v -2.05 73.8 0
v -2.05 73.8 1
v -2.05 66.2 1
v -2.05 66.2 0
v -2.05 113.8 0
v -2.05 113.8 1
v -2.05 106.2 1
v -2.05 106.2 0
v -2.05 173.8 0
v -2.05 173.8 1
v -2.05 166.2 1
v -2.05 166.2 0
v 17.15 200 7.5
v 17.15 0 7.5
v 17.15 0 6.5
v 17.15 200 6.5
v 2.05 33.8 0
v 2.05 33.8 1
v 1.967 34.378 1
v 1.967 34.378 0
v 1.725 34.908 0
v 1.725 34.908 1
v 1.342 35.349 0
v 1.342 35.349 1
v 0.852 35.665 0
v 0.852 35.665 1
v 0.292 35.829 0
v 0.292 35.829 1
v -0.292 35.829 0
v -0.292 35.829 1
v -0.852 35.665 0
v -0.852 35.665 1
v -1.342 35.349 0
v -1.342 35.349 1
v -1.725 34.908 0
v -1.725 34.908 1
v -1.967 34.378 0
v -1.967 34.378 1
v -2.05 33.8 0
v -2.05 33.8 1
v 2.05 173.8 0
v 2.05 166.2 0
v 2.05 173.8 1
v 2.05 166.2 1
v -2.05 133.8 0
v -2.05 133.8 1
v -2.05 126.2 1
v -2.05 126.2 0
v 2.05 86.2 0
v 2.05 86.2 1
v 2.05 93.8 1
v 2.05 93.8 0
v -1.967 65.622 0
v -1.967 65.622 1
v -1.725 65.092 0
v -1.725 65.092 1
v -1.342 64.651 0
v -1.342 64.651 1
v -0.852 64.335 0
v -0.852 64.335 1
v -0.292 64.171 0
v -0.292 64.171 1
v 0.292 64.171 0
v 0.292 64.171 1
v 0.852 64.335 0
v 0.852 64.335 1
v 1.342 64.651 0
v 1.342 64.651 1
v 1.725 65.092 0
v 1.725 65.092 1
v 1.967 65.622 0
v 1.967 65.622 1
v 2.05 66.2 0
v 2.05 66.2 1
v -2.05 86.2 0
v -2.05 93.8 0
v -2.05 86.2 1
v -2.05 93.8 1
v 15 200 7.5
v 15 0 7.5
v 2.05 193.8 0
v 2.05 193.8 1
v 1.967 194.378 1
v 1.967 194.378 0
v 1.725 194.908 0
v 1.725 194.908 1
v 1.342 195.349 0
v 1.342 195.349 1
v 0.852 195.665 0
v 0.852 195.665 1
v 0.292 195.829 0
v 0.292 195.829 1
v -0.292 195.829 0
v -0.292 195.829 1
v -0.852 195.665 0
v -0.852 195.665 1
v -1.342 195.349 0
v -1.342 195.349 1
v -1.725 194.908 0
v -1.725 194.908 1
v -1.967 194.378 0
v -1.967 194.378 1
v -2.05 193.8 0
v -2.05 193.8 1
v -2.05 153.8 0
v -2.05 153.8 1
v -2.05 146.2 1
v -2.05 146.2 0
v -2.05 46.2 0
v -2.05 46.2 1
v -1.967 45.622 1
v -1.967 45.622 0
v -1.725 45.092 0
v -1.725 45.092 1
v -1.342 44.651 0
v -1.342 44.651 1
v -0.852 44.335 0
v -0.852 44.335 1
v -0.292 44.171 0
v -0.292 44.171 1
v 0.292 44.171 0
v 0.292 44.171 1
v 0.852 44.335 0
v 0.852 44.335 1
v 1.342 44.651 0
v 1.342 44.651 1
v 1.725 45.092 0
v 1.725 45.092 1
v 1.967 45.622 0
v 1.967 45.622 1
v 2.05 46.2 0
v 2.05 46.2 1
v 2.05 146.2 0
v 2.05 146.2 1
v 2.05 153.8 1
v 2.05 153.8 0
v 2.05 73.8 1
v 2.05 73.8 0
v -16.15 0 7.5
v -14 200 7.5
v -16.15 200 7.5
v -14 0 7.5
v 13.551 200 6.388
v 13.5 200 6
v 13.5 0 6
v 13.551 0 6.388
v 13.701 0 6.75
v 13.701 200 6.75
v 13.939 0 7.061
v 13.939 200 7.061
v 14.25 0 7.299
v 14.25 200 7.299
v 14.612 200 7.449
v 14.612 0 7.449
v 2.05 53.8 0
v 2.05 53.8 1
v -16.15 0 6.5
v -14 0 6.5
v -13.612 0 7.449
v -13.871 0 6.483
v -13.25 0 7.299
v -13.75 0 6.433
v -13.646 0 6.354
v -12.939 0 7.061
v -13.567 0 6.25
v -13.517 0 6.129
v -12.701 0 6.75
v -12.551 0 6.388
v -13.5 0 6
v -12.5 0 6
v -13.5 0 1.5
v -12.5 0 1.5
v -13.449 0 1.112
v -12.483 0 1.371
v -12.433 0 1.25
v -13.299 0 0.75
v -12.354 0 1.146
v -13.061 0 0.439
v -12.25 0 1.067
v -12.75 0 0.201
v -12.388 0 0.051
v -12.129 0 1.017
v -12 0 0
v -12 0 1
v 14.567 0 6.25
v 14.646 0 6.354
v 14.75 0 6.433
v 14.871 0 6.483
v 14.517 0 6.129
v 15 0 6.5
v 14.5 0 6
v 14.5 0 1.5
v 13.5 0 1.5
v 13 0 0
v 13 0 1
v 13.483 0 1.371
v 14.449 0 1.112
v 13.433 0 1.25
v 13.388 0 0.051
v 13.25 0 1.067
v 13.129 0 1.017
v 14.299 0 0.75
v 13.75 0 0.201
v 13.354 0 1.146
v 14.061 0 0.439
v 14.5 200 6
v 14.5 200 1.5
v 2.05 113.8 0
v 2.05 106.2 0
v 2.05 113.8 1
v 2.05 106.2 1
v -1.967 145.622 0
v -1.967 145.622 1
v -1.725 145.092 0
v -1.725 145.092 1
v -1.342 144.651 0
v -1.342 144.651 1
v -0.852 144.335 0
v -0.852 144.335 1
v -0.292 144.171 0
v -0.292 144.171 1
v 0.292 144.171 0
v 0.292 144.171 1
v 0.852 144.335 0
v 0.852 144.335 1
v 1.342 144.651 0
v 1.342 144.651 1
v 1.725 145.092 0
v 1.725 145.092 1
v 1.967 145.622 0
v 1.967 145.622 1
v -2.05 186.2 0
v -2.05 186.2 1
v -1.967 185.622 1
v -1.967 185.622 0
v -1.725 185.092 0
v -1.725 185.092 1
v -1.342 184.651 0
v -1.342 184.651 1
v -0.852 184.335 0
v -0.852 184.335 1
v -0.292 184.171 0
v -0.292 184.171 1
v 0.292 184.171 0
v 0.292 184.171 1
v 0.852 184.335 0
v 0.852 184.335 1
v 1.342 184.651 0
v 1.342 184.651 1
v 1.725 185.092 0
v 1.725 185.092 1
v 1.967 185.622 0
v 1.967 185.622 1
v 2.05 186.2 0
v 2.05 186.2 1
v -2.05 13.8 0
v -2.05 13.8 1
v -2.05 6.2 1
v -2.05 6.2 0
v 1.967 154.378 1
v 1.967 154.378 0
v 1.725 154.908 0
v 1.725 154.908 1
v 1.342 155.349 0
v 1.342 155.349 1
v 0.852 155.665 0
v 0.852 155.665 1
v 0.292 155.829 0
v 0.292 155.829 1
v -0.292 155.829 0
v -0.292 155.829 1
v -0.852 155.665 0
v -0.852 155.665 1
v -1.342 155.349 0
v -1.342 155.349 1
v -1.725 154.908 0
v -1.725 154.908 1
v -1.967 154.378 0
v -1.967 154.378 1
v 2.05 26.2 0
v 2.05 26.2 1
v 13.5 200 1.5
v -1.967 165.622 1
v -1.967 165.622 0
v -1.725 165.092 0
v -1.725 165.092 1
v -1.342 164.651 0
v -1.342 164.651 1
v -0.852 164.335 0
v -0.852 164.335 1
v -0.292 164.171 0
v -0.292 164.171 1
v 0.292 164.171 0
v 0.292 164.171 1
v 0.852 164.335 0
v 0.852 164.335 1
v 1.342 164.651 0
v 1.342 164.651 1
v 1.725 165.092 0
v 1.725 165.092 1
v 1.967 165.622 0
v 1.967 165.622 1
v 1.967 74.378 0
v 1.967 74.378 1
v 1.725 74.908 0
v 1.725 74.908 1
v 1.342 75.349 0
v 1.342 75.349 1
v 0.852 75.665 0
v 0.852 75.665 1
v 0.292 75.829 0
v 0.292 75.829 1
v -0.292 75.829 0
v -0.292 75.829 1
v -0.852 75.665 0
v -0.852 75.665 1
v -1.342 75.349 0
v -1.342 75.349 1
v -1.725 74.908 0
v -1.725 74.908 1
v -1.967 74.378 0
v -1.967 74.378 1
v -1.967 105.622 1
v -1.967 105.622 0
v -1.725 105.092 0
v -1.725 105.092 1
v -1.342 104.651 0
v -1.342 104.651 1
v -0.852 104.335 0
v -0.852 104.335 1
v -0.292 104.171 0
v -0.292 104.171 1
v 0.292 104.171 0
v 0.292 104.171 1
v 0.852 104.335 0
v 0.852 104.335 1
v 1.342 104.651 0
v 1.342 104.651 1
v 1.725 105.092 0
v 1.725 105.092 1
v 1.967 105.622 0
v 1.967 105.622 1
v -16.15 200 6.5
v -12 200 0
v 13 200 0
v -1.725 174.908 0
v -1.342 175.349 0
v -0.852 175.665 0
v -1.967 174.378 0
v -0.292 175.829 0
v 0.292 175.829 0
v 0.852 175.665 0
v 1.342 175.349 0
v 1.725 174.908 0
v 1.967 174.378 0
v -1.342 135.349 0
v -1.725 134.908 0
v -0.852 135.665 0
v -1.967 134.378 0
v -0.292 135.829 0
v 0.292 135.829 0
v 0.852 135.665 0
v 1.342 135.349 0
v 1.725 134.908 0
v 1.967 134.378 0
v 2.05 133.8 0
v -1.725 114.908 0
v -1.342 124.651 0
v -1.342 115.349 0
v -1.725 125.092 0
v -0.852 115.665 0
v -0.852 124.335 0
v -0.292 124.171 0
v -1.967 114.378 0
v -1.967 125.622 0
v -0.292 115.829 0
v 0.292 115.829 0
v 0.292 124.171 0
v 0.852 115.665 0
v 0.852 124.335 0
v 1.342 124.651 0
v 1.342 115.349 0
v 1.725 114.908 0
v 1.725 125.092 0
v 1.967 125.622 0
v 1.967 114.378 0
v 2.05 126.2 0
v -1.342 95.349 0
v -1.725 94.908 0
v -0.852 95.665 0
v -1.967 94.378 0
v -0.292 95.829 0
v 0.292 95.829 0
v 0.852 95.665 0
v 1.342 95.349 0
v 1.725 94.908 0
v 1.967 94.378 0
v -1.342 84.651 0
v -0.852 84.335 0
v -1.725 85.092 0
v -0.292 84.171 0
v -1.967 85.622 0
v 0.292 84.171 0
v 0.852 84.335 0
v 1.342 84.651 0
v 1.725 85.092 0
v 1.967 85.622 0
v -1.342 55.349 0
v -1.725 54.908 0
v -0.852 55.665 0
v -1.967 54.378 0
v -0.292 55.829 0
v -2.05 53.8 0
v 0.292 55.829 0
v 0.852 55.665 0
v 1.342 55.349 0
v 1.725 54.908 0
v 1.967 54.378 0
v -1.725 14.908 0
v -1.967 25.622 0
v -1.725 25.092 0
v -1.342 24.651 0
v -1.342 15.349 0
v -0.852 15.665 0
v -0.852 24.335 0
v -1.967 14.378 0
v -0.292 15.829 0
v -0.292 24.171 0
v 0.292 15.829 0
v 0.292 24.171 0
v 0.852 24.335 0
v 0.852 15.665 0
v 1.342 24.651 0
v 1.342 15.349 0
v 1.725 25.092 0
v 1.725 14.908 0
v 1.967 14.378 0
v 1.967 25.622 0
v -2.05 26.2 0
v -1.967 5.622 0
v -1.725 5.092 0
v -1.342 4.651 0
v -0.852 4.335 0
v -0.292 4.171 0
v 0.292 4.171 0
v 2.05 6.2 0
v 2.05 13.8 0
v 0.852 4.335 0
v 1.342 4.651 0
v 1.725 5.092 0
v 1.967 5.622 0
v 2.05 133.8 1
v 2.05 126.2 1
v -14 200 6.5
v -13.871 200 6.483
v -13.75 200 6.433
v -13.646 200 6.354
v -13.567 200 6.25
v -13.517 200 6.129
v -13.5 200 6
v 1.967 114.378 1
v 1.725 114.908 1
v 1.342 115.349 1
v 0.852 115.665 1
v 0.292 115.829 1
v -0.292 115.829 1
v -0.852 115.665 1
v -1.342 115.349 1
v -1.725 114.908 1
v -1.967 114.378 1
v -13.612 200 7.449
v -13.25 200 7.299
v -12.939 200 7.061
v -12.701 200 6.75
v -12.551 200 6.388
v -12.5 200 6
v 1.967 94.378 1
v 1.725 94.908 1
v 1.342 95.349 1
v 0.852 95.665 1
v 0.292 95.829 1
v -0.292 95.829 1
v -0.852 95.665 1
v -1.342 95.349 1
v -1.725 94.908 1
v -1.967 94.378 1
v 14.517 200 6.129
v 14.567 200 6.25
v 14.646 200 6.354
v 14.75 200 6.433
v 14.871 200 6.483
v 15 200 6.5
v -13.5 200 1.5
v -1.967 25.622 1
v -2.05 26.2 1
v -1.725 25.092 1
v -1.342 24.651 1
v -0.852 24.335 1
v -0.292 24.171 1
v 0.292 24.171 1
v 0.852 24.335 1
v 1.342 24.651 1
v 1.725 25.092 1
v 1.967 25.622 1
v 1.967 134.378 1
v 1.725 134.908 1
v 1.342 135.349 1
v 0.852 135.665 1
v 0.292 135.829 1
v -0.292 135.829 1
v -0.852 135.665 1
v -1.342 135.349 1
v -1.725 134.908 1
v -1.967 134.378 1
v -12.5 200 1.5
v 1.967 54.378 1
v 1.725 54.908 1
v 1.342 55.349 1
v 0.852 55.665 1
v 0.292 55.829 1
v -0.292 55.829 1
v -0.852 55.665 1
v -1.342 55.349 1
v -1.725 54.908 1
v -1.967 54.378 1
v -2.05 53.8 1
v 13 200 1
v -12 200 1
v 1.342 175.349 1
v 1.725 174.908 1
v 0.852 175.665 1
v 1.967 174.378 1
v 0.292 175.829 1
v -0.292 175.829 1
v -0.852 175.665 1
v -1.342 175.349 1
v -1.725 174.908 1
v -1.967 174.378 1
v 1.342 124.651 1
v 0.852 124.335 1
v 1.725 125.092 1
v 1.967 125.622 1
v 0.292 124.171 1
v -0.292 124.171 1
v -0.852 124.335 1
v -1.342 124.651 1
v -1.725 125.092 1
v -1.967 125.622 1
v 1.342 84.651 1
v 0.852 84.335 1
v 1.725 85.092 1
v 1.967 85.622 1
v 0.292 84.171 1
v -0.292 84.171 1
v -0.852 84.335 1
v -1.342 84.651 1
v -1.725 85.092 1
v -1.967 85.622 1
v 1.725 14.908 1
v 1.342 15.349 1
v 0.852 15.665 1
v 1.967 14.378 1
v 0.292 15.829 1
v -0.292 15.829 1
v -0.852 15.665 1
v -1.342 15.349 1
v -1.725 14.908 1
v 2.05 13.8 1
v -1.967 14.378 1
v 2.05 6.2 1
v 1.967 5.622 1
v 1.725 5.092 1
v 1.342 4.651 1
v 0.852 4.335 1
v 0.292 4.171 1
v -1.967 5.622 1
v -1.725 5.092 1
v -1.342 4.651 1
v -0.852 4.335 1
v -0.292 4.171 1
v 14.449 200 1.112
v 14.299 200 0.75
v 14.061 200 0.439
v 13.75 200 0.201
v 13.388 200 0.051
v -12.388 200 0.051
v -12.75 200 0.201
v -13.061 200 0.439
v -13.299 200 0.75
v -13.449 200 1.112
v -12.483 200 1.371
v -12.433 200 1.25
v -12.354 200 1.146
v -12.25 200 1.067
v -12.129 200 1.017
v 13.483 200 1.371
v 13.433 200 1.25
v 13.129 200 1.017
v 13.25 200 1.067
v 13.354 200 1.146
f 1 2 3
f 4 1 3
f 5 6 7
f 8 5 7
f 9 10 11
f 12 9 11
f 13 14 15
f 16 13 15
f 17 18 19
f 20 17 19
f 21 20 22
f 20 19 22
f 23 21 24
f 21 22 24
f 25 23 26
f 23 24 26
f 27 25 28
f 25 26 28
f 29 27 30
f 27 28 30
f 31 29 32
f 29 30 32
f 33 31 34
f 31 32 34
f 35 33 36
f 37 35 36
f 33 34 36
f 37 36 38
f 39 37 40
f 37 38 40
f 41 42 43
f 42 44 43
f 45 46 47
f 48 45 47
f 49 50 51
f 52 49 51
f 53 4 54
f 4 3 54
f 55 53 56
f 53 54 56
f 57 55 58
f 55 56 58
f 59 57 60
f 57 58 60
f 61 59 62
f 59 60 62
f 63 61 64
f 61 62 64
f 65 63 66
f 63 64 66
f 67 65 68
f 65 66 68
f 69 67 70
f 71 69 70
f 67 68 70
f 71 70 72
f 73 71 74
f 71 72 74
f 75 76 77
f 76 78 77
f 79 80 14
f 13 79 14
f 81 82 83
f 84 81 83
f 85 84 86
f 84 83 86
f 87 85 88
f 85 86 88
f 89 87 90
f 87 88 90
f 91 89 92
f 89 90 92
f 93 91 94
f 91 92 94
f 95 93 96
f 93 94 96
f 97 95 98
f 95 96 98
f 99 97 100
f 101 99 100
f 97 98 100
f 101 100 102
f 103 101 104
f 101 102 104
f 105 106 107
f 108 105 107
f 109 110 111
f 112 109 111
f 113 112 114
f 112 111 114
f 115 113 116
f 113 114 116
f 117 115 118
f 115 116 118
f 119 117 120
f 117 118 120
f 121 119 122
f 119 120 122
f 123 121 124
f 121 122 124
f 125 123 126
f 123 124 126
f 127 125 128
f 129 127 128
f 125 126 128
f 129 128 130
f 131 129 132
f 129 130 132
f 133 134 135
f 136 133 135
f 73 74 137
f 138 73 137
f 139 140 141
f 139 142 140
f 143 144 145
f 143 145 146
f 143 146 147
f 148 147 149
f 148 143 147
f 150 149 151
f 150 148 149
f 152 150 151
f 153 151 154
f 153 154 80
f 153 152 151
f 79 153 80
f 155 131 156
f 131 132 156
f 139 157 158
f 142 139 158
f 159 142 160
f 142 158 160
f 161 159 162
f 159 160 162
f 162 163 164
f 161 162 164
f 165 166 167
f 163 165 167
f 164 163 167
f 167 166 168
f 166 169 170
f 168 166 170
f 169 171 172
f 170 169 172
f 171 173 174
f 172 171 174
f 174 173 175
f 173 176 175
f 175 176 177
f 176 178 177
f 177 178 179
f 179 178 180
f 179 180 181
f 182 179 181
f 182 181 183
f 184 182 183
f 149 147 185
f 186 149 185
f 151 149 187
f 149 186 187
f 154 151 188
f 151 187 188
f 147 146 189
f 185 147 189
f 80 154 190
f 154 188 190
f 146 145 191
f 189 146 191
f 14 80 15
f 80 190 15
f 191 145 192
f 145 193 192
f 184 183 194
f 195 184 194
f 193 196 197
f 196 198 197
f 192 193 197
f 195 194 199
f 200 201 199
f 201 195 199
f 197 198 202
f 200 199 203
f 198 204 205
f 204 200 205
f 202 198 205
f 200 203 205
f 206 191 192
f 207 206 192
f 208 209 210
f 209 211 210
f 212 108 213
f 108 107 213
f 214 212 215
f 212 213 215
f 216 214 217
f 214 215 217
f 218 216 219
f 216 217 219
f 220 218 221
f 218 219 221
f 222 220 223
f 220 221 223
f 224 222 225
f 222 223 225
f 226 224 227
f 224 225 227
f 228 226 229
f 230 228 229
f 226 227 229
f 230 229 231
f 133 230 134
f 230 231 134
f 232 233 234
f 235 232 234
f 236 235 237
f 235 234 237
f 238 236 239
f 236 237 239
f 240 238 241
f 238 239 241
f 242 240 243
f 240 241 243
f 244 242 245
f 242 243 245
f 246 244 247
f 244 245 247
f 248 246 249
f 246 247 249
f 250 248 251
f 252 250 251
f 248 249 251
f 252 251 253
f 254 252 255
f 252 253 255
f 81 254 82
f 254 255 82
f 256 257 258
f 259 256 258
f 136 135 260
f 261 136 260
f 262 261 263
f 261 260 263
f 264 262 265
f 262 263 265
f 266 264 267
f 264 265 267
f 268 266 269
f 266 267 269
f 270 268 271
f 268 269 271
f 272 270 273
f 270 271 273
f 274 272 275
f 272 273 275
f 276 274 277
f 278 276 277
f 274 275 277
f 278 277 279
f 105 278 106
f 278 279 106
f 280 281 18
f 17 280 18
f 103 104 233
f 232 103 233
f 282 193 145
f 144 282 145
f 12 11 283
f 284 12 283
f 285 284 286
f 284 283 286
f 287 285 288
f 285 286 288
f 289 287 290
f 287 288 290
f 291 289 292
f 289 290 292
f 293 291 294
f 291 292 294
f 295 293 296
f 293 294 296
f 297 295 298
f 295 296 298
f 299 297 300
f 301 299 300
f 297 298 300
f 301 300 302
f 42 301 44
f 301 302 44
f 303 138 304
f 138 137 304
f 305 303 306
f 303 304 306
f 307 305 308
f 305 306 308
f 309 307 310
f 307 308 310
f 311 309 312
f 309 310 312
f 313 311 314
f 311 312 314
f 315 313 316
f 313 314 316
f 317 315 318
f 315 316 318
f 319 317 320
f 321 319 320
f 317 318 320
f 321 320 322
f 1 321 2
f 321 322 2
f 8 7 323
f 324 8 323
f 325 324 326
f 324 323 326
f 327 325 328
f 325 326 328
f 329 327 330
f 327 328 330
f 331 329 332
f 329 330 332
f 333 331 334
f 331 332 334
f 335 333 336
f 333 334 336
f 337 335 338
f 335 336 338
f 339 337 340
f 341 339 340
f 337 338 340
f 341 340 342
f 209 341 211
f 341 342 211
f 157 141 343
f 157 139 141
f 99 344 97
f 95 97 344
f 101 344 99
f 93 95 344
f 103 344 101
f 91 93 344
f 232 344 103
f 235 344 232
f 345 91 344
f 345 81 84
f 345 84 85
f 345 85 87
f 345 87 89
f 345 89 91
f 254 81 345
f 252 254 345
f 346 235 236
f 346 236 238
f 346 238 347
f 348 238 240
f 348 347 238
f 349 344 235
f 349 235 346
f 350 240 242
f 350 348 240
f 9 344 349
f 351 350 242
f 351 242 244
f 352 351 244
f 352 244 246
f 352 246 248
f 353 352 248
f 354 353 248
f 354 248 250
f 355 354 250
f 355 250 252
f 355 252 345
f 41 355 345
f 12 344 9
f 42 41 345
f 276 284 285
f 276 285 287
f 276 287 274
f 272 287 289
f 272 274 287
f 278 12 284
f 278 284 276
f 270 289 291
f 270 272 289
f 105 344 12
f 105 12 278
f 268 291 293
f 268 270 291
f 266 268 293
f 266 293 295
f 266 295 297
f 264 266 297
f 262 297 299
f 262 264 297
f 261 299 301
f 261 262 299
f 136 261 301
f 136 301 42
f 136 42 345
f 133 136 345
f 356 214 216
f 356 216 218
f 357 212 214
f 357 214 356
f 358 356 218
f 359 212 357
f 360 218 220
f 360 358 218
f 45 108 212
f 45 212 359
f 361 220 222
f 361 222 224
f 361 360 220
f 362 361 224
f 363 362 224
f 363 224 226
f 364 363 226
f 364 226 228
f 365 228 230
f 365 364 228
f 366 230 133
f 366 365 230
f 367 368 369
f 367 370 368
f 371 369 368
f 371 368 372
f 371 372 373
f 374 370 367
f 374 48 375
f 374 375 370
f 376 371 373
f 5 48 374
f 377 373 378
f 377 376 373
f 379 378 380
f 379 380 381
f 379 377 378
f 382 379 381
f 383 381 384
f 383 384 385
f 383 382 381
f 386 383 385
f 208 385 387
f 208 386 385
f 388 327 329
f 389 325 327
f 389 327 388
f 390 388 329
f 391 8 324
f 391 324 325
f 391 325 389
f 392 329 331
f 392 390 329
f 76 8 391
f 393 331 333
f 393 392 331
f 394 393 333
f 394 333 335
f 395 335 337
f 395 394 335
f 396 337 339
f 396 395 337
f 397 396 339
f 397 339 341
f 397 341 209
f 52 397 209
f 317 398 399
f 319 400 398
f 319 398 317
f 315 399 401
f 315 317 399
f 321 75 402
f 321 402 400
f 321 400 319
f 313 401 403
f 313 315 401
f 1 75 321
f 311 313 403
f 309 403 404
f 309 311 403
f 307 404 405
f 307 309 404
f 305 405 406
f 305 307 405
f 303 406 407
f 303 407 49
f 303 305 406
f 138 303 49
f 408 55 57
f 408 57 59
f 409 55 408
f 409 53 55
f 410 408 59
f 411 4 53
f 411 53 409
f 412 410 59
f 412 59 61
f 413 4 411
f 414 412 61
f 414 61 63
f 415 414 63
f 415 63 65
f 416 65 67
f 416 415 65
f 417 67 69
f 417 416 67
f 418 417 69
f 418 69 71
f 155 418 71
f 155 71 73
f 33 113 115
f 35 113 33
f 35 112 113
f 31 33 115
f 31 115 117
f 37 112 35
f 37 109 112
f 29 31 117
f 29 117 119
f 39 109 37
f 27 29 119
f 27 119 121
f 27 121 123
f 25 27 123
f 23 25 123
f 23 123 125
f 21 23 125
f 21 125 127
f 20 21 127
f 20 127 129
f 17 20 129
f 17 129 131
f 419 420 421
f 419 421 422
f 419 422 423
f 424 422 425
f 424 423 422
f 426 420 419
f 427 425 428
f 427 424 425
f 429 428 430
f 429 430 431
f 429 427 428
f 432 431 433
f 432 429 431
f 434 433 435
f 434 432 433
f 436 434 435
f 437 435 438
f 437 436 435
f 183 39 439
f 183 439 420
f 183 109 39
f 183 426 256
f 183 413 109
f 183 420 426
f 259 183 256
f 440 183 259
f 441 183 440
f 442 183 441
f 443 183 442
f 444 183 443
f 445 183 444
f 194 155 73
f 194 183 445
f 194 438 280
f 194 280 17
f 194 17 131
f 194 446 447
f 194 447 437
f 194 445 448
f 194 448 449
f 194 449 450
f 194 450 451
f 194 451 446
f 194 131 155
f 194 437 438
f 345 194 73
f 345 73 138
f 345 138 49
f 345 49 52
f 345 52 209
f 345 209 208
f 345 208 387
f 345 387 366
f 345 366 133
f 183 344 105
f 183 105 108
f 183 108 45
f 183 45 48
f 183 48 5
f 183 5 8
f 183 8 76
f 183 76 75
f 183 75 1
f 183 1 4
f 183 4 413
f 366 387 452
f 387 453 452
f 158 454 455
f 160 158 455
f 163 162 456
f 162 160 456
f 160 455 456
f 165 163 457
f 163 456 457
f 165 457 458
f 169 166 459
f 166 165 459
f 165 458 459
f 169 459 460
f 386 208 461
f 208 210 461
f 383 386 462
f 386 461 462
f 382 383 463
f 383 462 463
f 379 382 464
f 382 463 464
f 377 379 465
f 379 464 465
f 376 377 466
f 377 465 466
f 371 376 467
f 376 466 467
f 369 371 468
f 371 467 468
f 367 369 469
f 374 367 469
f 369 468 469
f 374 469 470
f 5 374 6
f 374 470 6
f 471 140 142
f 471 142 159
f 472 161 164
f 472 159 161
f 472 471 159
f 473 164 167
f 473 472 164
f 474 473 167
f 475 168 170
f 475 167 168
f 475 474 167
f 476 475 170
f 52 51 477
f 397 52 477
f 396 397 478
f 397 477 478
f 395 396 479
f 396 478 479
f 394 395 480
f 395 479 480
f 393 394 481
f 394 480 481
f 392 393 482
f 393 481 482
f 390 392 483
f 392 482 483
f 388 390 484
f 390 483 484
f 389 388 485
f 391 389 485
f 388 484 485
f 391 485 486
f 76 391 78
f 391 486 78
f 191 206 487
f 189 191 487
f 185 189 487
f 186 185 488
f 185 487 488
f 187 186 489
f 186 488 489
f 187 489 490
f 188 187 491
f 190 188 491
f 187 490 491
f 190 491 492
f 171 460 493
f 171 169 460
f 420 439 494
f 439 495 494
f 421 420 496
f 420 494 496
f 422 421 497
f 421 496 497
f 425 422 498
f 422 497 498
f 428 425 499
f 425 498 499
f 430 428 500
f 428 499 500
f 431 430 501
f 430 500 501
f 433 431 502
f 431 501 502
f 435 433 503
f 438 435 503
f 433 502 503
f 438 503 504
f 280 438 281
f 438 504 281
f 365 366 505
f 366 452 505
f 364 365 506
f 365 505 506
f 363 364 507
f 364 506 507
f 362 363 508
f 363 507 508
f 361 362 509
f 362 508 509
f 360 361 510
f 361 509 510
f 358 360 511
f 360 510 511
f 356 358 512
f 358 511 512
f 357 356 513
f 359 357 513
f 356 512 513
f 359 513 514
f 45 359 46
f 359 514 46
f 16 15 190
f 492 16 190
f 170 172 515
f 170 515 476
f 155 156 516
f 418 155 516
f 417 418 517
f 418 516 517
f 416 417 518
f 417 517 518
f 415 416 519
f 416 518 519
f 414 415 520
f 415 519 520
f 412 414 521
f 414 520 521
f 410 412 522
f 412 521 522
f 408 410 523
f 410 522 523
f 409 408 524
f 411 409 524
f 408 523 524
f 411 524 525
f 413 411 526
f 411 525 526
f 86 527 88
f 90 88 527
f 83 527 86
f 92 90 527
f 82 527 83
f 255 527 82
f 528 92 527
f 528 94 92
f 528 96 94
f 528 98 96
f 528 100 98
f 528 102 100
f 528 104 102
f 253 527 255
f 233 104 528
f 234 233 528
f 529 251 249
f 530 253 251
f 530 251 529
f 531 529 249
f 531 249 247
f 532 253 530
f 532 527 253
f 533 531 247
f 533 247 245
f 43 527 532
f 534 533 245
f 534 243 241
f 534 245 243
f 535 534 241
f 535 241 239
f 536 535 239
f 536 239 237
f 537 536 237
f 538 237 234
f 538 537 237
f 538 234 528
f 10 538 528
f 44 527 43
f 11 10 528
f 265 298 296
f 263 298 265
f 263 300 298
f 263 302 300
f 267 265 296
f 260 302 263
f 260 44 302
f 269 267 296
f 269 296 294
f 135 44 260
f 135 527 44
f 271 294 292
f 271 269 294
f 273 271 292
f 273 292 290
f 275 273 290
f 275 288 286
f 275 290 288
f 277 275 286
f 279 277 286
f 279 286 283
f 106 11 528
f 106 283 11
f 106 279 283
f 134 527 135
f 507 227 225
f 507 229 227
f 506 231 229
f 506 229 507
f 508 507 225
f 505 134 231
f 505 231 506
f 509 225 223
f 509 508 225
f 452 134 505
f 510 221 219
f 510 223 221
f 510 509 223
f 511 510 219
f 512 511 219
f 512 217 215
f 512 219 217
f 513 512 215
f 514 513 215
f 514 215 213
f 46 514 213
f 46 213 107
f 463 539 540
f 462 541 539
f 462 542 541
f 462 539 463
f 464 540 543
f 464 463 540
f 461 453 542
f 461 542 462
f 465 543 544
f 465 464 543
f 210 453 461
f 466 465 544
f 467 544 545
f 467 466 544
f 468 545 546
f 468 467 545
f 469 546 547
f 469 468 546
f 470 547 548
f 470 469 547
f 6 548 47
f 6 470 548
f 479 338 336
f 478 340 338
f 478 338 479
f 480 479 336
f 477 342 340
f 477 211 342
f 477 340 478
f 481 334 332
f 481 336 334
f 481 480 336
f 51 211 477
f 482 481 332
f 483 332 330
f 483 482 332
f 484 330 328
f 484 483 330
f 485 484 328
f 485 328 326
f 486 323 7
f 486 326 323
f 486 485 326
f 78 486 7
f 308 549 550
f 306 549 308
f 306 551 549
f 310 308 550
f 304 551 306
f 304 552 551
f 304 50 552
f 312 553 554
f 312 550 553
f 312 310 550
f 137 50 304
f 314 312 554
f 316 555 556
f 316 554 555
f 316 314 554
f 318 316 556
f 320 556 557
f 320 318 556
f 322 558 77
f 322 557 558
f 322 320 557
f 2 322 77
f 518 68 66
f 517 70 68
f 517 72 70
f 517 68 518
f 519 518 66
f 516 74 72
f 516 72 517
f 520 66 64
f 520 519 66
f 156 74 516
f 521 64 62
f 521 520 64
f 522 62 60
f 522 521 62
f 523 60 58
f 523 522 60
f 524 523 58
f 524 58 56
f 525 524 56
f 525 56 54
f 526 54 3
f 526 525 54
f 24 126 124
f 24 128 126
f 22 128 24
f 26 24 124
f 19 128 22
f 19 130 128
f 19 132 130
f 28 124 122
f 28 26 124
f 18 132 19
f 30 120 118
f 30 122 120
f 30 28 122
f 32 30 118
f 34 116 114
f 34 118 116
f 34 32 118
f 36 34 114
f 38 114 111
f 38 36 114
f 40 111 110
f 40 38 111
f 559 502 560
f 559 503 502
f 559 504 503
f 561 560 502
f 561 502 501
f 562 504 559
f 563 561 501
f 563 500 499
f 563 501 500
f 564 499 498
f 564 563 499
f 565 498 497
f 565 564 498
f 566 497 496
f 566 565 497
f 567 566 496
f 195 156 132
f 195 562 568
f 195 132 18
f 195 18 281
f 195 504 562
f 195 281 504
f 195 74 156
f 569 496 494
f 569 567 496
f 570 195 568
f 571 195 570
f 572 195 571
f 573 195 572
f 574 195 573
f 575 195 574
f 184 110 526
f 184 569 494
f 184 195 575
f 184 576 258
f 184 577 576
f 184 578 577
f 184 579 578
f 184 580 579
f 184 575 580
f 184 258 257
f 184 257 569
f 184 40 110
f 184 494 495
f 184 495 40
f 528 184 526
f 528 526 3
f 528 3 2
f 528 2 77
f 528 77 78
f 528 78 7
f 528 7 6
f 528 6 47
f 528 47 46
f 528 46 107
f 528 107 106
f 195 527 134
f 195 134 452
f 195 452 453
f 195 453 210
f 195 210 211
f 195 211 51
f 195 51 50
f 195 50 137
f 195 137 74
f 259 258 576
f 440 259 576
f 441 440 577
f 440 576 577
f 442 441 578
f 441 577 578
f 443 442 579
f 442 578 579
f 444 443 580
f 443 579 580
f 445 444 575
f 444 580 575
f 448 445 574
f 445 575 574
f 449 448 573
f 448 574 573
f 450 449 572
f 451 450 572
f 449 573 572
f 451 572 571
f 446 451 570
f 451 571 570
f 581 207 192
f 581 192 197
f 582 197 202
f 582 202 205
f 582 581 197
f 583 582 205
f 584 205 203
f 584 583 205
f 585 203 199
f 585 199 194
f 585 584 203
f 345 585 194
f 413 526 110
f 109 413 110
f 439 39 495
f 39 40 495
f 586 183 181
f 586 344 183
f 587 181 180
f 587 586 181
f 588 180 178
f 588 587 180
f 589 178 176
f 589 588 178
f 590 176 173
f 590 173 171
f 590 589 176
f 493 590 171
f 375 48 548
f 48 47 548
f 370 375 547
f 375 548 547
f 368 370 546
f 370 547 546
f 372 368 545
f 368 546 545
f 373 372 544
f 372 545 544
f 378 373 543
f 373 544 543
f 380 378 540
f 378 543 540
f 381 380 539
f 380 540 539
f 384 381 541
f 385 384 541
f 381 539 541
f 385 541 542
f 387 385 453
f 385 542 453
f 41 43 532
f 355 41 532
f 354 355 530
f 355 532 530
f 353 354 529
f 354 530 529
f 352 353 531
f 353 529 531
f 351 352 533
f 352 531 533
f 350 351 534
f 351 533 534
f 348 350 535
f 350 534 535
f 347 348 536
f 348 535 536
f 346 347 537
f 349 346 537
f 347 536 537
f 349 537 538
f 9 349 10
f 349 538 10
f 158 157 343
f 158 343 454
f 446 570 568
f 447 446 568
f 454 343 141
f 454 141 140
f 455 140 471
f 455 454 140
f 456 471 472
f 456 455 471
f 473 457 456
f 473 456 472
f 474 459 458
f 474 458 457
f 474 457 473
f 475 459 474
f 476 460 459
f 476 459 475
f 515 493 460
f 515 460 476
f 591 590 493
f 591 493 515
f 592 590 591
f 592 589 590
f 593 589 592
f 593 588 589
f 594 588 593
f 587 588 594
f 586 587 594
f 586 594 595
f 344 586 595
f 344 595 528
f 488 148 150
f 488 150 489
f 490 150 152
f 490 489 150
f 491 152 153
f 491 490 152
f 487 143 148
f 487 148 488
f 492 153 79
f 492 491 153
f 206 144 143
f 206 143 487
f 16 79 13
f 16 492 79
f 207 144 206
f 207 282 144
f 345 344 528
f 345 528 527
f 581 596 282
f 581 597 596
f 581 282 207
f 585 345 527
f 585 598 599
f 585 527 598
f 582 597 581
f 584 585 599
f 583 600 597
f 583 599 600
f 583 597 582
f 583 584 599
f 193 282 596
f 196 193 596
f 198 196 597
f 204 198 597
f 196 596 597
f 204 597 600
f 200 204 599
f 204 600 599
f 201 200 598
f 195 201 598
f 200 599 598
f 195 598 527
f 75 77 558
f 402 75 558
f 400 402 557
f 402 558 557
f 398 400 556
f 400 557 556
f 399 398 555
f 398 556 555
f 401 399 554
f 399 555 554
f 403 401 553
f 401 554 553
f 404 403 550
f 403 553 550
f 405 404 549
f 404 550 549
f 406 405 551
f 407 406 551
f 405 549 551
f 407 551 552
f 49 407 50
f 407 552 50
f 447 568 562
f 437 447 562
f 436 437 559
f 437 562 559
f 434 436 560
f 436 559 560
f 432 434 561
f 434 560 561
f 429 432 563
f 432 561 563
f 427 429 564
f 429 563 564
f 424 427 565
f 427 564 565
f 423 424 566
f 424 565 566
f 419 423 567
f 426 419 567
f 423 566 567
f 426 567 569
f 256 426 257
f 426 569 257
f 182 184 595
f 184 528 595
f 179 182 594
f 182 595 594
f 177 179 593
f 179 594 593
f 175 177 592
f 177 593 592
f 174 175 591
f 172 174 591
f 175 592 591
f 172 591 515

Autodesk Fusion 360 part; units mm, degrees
sketch "Skizze1" plane through (0, 0, 0) normal (0, 1, 0) x (1, 0, 0)
  line L0 (14.5, -1) -> (-13.5, -1)
  line L1 (-13.5, -1) -> (-13.5, 0)
  line L2 (-13.5, 0) -> (14.5, 0)
  line L3 (14.5, 0) -> (14.5, -1)
  line L4 (14.5, -1) -> (-13.5, 0) construction
  line L5 (-13.5, -1) -> (14.5, 0) construction
  line L6 (-13.5, 0) -> (-12.5, 0)
  line L7 (-12.5, 0) -> (-12.5, -7.5)
  line L8 (-12.5, -7.5) -> (-13.5, -7.5)
  line L9 (-13.5, -7.5) -> (-13.5, 0)
  line L10 (14.5, 0) -> (13.5, 0)
  line L11 (13.5, 0) -> (13.5, -7.5)
  line L12 (13.5, -7.5) -> (14.5, -7.5)
  line L13 (14.5, -7.5) -> (14.5, 0)
  line L14 (-12.5, -7.5) -> (-16.15, -7.5)
  line L15 (-16.15, -7.5) -> (-16.15, -6.5)
  line L16 (-16.15, -6.5) -> (-12.5, -6.5)
  line L17 (-12.5, -6.5) -> (-12.5, -7.5)
  line L18 (13.5, -7.5) -> (17.15, -7.5)
  line L19 (17.15, -7.5) -> (17.15, -6.5)
  line L20 (17.15, -6.5) -> (13.5, -6.5)
  line L21 (13.5, -6.5) -> (13.5, -7.5)
  point P0 (0.5, -0.5)
  dimension "d7" = 28
  dimension "d8" = 1
  dimension "d9" = 7.5
  dimension "d10" = 1
  dimension "d11" = 7.5
  dimension "d12" = 1
  dimension "d13" = 3.65
  dimension "d14" = 1
  dimension "d15" = 3.65
  dimension "d16" = 1
extrude "Extrusion1" add sketch "Skizze1" along normal blind 200
fillet "Abrundung1" radius 1.5 4 edges at (13.5, 100, 7.5) (-12.5, 100, 7.5) (14.5, 100, 0) (-13.5, 100, 0)
fillet "Abrundung2" radius 0.5 4 edges at (-13.5, 100, 6.5) (14.5, 100, 6.5) (13.5, 100, 1) (-12.5, 100, 1)
sketch "Skizze2" plane through (0, 0, 1) normal (0, 0, 1) x (-1, 0, 0)
  line L0 (12, -200) -> (12, 0)
  line L1 (12, 0) -> (-13, 0)
  line L2 (-13, 0) -> (-13, -200)
  line L3 (-13, -200) -> (12, -200)
  line L4 (0, 0) -> (0, -4.15) construction
  line L5 (-2.05, -6.2) -> (-2.05, -13.8)
  arc A0 (-2.05, -13.8) -> (2.05, -13.8) centre (0, -13.8) ccw
  line L6 (2.05, -13.8) -> (2.05, -6.2)
  arc A1 (2.05, -6.2) -> (-2.05, -6.2) centre (0, -6.2) ccw
  line L7 (0, -4.15) -> (0, -15.85) construction
  point P0 (0, -4.15)
  dimension "d26" = 4.15
  dimension "d34" = 11.7
  dimension "d35" = 4.1
extrude "Extrusion2" cut sketch "Skizze2" against normal blind 1 contours L5 A0 L6 A1
pattern_linear "R-Anordnung1" count 10 spacing 20 along (0, 1, 0) of "Extrusion2"
equation "InnerWidth = 28 mm" comment "BI"
equation "OuterWidth = 35.3 mm" comment "35"
equation "Height = 7.5 mm" comment "h"
equation "Thickness = 1 mm" comment "D"
equation "Length = 200 mm" comment "L"
equation "SlotDistance = 25 mm" comment "ALL"
equation "d7 = InnerWidth"
equation "d8 = Thickness"
equation "d9 = Height"
equation "d10 = Thickness"
equation "d11 = Height"
equation "d12 = Thickness"
equation "d13 = ( OuterWidth - InnerWidth ) / 2"
equation "d14 = Thickness"
equation "d15 = ( OuterWidth - InnerWidth ) / 2"
equation "d16 = Thickness"
equation "d17 = Length"
equation "OuterFillet = 1.5 mm" comment "R"
equation "d20 = OuterFillet"
equation "InnerFillet = OuterFillet - Thickness" comment "RK"
equation "d22 = InnerFillet"
equation "SlotWidth = 4.1 mm" comment "LLB"
equation "SlotLength = 11.7 mm" comment "LLH"
equation "SlotDistance2 = 20 mm" comment "LLA"
equation "d26 = ( ( Length - ( ( Length / SlotDistance2 ) * SlotLength ) ) / ( Length / SlotDistance2 ) ) / 2"
equation "d28 = -Thickness"
equation "d30 = Length / SlotDistance2"
equation "d32 = SlotDistance2"
equation "d34 = SlotLength"
equation "d35 = SlotWidth"
